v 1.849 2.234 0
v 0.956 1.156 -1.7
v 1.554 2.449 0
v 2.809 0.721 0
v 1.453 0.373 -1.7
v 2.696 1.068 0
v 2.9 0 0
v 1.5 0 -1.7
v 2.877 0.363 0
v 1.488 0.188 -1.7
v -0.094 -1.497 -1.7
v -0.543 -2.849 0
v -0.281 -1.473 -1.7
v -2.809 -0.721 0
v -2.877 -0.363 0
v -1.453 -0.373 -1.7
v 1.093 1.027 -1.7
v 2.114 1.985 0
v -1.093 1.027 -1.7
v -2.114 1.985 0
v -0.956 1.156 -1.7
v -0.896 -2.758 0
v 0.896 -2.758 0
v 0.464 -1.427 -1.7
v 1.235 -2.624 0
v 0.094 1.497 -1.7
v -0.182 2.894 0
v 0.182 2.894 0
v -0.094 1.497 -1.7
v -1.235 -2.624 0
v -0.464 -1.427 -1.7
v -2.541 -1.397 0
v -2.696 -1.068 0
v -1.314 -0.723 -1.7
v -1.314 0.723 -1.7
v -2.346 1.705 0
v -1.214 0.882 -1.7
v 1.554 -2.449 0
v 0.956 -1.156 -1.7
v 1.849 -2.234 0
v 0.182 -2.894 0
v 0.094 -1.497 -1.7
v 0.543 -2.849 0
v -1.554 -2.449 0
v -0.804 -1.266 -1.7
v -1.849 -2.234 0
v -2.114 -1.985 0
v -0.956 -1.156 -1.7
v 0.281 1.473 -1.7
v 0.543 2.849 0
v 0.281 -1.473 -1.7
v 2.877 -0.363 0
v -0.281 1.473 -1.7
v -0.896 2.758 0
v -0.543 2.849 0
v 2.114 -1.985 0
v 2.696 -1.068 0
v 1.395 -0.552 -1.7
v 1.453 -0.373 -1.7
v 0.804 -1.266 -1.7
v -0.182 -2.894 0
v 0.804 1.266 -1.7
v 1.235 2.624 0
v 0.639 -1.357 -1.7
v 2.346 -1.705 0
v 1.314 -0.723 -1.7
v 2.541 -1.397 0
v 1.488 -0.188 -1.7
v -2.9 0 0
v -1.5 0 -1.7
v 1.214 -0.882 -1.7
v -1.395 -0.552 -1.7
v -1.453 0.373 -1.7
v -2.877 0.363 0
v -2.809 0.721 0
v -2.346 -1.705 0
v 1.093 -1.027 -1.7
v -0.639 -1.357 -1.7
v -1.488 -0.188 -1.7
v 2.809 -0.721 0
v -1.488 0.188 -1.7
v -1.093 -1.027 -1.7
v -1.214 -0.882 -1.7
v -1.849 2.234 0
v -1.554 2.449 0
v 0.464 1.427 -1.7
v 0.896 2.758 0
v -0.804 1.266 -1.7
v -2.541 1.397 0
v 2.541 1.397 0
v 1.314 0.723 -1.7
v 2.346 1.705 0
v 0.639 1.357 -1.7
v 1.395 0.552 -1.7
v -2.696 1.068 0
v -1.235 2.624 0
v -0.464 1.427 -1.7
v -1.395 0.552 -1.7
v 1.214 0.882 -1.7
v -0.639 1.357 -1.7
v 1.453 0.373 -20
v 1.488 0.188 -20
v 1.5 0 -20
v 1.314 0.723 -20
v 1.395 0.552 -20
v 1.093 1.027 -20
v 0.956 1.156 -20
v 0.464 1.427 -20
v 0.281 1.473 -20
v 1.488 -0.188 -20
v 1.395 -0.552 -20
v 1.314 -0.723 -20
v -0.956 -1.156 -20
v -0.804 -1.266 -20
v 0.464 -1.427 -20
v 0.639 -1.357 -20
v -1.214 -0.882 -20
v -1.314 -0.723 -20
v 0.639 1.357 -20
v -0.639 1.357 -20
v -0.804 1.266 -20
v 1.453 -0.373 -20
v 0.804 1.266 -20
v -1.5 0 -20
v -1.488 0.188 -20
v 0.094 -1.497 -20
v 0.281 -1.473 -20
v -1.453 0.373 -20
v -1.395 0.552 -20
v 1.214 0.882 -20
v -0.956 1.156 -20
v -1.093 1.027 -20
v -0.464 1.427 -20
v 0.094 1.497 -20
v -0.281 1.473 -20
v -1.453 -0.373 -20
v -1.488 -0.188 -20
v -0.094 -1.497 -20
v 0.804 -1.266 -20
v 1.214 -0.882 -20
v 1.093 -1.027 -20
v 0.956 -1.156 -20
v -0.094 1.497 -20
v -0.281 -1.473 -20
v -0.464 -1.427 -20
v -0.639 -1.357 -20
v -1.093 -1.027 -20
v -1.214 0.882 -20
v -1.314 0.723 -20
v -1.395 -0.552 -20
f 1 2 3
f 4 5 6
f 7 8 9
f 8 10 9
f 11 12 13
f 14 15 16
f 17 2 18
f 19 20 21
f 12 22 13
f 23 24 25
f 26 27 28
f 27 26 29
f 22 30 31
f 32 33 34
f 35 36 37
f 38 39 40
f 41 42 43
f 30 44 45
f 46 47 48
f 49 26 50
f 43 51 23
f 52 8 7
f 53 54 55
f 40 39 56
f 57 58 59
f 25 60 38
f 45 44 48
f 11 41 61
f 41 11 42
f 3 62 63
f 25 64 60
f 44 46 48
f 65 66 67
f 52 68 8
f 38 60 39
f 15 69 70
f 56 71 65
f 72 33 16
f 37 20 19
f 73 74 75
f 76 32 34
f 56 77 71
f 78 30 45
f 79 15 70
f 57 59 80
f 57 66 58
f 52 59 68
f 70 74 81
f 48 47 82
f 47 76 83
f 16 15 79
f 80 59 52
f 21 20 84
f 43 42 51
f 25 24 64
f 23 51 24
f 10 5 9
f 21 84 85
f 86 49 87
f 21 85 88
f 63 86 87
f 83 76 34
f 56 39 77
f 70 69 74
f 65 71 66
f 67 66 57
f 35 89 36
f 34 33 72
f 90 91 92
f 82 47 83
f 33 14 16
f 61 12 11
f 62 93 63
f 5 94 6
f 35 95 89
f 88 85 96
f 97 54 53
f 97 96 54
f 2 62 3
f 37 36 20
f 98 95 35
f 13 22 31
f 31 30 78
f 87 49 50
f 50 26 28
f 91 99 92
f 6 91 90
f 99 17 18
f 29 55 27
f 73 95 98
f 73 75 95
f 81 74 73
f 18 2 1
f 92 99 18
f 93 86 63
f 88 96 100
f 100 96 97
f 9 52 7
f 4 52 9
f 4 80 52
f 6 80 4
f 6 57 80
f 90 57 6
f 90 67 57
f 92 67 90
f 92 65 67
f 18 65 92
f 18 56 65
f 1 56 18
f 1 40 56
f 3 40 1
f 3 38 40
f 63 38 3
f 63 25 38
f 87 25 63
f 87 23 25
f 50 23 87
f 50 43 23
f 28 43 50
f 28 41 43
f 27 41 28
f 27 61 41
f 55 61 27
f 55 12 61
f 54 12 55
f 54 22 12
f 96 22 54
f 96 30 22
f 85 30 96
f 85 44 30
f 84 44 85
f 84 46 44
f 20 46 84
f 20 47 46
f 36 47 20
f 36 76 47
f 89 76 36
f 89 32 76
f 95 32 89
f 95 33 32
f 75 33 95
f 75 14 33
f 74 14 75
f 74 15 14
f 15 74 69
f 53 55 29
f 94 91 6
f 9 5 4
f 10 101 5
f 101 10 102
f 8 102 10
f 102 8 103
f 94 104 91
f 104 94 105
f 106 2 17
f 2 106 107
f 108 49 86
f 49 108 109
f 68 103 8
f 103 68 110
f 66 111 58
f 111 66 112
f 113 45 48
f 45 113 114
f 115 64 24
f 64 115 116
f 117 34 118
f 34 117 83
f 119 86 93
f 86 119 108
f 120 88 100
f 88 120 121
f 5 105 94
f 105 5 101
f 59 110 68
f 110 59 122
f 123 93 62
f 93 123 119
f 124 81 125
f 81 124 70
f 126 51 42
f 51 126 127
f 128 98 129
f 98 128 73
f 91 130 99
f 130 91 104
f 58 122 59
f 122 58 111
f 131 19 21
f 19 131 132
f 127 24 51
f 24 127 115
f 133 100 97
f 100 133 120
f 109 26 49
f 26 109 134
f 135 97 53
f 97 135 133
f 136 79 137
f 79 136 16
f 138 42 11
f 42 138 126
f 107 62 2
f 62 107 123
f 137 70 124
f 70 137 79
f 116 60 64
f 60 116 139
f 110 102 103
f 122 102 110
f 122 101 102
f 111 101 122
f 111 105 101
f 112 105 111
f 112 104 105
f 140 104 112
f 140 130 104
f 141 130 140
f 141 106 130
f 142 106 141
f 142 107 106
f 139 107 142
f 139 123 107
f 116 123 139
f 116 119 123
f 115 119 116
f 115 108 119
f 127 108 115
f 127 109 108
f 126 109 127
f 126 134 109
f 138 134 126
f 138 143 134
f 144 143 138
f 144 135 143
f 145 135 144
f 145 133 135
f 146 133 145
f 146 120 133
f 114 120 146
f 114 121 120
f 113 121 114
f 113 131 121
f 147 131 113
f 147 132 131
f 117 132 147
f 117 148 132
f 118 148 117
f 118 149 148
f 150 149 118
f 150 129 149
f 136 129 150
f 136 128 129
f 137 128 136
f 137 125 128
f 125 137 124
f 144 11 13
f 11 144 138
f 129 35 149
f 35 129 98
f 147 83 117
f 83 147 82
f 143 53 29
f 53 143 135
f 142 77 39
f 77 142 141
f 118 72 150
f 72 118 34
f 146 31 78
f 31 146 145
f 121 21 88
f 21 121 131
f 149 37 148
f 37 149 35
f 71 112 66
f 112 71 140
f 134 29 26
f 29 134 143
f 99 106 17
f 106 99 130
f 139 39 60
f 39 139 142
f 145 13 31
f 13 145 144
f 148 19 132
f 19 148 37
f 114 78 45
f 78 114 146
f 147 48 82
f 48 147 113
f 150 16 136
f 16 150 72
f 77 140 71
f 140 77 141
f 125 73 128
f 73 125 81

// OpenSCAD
$fn = 50;


difference() {
	union() {
		translate(v = [0, 0, -1.7000000000]) {
			rotate(a = [0, 0, 0]) {
				cylinder(h = 1.7000000000, r1 = 1.5000000000, r2 = 2.9000000000);
			}
		}
		translate(v = [0, 0, -20]) {
			rotate(a = [0, 0, 0]) {
				cylinder(h = 20, r = 1.5000000000);
			}
		}
	}
	union();
}
